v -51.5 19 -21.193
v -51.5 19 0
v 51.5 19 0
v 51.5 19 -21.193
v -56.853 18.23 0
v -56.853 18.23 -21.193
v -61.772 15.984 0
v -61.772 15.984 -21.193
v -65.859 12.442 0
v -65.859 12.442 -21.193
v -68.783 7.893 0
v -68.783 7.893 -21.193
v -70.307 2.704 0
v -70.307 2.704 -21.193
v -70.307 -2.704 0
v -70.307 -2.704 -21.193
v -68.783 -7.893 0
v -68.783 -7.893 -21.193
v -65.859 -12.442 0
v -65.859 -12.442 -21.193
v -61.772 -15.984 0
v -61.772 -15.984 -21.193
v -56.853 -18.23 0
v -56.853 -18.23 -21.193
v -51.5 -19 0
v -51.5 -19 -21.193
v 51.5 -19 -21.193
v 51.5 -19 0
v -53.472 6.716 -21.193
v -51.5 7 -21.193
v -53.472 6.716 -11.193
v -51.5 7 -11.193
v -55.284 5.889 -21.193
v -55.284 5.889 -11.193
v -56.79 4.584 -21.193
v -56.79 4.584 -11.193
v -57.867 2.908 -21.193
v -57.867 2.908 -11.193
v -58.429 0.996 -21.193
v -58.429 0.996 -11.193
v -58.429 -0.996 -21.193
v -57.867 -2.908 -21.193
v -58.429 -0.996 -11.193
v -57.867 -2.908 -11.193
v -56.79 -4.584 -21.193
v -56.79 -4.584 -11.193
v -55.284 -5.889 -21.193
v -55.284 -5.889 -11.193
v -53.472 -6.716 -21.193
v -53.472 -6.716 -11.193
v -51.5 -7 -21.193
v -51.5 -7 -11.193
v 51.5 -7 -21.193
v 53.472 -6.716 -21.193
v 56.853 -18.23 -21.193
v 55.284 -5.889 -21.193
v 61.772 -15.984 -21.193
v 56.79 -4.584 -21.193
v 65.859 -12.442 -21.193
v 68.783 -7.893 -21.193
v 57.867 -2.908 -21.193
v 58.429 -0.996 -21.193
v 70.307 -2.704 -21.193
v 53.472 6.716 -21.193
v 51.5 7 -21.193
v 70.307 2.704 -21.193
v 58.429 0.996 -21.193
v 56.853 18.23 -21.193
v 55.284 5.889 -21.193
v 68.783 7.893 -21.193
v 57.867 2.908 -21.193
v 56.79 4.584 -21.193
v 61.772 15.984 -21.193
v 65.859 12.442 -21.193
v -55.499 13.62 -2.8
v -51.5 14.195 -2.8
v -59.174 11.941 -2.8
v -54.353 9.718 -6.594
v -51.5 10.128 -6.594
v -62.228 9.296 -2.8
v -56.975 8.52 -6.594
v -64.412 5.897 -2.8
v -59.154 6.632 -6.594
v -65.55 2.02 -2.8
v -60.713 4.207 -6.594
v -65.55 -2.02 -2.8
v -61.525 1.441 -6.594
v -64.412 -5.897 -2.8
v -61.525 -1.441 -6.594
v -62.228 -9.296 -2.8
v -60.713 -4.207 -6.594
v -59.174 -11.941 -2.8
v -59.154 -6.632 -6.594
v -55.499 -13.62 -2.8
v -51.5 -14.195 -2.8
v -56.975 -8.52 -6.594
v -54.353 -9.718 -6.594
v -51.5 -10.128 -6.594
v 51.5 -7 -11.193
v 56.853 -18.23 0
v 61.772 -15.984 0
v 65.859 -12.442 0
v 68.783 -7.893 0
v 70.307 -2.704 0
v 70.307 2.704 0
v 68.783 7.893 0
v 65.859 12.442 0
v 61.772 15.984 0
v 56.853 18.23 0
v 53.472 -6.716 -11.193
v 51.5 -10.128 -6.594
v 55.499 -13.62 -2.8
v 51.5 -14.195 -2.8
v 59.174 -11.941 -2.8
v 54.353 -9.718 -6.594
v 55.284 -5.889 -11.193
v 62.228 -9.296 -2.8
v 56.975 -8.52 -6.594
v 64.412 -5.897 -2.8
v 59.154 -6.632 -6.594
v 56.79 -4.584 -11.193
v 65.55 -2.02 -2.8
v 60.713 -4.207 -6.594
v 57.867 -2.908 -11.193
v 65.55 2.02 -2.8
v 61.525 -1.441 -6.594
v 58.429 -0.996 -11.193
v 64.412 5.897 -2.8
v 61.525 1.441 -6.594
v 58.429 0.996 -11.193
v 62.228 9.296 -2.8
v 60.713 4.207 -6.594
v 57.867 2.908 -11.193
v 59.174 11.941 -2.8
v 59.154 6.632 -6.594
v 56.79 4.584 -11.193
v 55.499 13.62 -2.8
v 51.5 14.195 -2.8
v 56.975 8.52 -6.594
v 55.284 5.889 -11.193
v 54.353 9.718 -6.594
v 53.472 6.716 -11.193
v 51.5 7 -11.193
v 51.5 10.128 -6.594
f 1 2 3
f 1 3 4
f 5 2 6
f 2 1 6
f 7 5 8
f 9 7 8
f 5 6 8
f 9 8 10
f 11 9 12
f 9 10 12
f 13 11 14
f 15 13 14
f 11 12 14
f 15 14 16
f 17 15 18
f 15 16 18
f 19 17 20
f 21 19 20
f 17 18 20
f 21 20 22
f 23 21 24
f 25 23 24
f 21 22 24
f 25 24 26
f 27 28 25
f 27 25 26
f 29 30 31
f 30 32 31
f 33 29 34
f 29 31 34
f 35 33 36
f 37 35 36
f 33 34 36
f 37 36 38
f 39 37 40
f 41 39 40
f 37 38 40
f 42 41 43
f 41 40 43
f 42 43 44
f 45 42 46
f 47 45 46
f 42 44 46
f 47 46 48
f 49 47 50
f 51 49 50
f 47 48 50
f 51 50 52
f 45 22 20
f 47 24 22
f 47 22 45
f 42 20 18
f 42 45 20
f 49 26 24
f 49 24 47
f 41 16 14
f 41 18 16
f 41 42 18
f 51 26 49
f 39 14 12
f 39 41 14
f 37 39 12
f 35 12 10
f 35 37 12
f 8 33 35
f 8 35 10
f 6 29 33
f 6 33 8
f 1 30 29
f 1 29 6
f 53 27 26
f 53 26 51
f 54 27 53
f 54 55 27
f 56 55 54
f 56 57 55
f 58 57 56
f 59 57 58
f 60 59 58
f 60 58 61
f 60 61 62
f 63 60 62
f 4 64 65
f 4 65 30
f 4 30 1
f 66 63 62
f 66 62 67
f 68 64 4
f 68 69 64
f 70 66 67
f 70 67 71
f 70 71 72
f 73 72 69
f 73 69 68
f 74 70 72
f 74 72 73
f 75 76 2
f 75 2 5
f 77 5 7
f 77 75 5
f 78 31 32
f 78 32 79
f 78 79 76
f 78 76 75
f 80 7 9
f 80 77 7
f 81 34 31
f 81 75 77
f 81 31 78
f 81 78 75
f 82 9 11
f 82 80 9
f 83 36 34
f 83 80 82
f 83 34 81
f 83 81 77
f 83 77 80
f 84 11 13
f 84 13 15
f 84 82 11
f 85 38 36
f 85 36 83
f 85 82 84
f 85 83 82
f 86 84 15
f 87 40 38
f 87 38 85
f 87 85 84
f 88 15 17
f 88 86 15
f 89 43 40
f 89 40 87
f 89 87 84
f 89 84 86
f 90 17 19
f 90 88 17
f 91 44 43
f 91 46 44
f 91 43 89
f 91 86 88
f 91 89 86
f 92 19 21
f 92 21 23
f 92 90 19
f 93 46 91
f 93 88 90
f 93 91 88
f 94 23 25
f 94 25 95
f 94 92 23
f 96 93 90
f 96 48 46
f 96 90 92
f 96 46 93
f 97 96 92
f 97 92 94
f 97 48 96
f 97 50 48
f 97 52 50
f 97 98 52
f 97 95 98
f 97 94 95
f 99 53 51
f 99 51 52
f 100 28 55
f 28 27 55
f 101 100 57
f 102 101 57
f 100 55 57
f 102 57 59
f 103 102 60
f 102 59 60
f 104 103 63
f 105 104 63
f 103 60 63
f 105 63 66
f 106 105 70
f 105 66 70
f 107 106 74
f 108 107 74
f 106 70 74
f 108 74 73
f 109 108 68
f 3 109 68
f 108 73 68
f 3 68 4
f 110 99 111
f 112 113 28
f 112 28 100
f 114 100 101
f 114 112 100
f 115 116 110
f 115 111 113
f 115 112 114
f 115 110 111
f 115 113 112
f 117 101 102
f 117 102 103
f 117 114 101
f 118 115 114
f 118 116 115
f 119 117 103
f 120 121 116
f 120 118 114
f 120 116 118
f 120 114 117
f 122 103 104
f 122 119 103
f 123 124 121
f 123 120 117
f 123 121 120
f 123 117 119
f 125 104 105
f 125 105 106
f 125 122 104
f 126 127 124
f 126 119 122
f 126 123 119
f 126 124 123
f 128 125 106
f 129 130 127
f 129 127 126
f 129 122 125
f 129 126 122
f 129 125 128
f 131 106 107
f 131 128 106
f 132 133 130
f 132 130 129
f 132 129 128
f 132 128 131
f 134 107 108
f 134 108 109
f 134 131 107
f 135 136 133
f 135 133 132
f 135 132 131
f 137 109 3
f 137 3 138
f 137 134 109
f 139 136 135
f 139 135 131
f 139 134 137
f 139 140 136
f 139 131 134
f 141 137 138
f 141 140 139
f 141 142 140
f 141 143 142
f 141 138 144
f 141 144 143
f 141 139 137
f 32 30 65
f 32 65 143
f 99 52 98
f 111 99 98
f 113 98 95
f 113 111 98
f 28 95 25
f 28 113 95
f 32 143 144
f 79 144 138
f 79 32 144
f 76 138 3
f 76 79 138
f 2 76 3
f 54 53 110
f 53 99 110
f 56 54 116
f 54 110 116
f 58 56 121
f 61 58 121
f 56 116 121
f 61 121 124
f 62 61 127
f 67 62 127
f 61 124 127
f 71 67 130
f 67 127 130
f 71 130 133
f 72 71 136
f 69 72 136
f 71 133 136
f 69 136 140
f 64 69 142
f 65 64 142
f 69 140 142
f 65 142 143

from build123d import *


with BuildPart() as f2:
    # F2: sweep along a path in F0
    with BuildLine(Plane.XY) as f2_path:
        Line((-51.5, -19), (51.5, -19))
        ThreePointArc((51.5, -19), (70.5, 0), (51.5, 19))
        Line((51.5, 19), (-51.5, 19))
        ThreePointArc((-51.5, 19), (-70.5, 0), (-51.5, -19))
    # F1 (on Right) → F2 (sweep)
    with BuildSketch(Plane.YZ):
        with BuildLine():
            Line((-7, -21.192692), (-7, -11.192692))
            ThreePointArc((-7, -11.192692), (-12.055502, -4.583723), (-19, 0))
            Line((-19, 0), (-19, -11.192692))
            Line((-19, -11.192692), (-19, -21.192692))
            Line((-19, -21.192692), (-7, -21.192692))
        make_face()
    sweep(path=f2_path.line)


solid = f2.part
